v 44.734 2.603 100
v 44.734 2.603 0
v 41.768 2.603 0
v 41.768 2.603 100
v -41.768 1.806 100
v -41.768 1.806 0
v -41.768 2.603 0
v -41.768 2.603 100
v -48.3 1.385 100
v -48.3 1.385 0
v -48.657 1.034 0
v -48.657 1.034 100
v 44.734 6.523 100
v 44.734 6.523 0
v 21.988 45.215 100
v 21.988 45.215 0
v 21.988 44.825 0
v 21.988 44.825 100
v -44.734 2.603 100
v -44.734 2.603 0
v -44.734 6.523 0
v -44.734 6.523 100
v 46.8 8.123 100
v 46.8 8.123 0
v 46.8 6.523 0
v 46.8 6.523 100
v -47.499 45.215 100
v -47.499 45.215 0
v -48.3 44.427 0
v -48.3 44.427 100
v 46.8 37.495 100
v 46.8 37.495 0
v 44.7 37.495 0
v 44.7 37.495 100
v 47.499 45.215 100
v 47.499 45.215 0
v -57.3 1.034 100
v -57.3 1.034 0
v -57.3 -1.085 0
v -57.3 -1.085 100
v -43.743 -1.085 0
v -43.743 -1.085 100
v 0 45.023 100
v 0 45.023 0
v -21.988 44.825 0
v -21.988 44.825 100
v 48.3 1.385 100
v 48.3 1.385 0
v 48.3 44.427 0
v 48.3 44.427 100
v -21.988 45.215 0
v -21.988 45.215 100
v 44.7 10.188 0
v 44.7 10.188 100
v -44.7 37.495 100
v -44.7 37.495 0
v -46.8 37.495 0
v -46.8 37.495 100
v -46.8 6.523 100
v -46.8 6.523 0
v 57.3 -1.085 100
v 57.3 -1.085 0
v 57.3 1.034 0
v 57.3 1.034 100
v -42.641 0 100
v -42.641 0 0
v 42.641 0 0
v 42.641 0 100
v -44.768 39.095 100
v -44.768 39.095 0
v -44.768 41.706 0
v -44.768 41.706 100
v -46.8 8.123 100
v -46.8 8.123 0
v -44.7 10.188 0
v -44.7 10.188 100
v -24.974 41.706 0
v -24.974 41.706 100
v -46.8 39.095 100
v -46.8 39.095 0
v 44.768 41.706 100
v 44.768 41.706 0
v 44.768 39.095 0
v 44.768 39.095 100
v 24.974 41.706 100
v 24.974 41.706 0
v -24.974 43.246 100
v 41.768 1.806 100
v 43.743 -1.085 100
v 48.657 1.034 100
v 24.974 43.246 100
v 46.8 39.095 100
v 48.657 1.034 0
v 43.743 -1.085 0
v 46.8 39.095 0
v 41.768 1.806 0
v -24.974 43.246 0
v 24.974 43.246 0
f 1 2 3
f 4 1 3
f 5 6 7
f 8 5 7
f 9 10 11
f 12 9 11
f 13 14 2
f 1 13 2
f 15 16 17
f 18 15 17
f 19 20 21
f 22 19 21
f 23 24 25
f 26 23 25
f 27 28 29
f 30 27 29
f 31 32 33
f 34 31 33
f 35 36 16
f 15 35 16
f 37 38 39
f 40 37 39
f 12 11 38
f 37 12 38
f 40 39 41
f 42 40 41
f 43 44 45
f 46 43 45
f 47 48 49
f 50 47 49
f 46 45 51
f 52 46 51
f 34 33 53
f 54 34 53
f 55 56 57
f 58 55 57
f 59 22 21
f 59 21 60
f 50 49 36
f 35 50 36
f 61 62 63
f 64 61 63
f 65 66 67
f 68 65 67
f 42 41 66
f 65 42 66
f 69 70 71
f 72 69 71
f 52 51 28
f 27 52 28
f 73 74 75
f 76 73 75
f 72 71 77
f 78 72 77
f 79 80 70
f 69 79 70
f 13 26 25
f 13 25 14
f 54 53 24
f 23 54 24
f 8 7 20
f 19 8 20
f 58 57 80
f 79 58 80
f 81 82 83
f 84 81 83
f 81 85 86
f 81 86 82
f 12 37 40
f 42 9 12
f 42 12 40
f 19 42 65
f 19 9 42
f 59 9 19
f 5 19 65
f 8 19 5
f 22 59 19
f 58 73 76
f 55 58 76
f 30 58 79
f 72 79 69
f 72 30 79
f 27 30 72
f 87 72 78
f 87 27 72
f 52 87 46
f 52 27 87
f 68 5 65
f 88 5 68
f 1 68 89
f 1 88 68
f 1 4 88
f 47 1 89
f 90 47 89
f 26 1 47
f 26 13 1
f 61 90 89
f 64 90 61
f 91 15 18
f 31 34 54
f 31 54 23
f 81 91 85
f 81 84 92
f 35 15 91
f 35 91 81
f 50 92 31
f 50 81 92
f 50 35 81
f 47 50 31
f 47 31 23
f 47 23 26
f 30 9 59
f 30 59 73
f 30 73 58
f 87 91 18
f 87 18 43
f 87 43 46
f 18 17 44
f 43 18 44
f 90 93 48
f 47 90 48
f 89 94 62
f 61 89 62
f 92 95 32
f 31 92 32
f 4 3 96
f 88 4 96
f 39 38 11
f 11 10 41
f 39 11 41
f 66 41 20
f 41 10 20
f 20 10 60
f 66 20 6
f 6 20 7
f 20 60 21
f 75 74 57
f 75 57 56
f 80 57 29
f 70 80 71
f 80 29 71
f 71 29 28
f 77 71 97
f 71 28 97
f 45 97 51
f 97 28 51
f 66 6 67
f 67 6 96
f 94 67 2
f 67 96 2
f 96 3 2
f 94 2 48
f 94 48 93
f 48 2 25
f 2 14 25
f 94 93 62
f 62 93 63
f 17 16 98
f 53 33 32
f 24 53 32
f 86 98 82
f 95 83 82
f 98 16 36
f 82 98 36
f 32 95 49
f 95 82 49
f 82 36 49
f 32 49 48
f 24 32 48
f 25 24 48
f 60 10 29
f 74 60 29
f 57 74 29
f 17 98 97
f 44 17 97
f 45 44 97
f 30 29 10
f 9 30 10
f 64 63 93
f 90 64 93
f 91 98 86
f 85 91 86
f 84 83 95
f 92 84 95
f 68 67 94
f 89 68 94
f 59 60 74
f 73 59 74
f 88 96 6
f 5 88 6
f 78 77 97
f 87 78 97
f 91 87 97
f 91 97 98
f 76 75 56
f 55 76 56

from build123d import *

# Parameters (mm, degrees)
BOSS_EXTRUDE1_DEPTH = 100


with BuildPart() as part:
    # Sketch1 → Boss-Extrude1 (new body)
    with BuildSketch(Plane.XY):
        Polygon((-42.640501462, 0), (0, 0), (0, 1.805938608), (-41.76781617, 1.805938608), (-41.76781617, 2.603006823), (-44.734392464, 2.603006823), (-44.734392464, 6.522673981), (-46.8, 6.522673981), (-46.8, 8.122673981), (-44.7, 10.188281516), (-44.7, 37.494976181), (-46.8, 37.494976181), (-46.8, 39.094976181), (-44.767698794, 39.094976181), (-44.767698794, 41.705938608), (-24.973882416, 41.705938608), (-24.973882416, 43.24560851), (0, 43.24560851), (0, 45.023153475), (-21.988241511, 44.824503247), (-21.988241511, 45.21521639), (-47.498865937, 45.21521639), (-48.3, 44.427202791), (-48.3, 1.384902814), (-48.656798132, 1.033948095), (-57.3, 1.033948095), (-57.3, -1.08478361), (-43.743346771, -1.08478361), align=None)
        Polygon((0, 0), (42.640501462, 0), (43.743346771, -1.08478361), (57.3, -1.08478361), (57.3, 1.033948095), (48.656798132, 1.033948095), (48.3, 1.384902814), (48.3, 44.427202791), (47.498865937, 45.21521639), (21.988241511, 45.21521639), (21.988241511, 44.824503247), (0, 45.023153475), (0, 43.24560851), (24.973882416, 43.24560851), (24.973882416, 41.705938608), (44.767698794, 41.705938608), (44.767698794, 39.094976181), (46.8, 39.094976181), (46.8, 37.494976181), (44.7, 37.494976181), (44.7, 10.188281516), (46.8, 8.122673981), (46.8, 6.522673981), (44.734392464, 6.522673981), (44.734392464, 2.603006823), (41.76781617, 2.603006823), (41.76781617, 1.805938608), (0, 1.805938608), align=None)
    extrude(amount=BOSS_EXTRUDE1_DEPTH)


solid = part.part
